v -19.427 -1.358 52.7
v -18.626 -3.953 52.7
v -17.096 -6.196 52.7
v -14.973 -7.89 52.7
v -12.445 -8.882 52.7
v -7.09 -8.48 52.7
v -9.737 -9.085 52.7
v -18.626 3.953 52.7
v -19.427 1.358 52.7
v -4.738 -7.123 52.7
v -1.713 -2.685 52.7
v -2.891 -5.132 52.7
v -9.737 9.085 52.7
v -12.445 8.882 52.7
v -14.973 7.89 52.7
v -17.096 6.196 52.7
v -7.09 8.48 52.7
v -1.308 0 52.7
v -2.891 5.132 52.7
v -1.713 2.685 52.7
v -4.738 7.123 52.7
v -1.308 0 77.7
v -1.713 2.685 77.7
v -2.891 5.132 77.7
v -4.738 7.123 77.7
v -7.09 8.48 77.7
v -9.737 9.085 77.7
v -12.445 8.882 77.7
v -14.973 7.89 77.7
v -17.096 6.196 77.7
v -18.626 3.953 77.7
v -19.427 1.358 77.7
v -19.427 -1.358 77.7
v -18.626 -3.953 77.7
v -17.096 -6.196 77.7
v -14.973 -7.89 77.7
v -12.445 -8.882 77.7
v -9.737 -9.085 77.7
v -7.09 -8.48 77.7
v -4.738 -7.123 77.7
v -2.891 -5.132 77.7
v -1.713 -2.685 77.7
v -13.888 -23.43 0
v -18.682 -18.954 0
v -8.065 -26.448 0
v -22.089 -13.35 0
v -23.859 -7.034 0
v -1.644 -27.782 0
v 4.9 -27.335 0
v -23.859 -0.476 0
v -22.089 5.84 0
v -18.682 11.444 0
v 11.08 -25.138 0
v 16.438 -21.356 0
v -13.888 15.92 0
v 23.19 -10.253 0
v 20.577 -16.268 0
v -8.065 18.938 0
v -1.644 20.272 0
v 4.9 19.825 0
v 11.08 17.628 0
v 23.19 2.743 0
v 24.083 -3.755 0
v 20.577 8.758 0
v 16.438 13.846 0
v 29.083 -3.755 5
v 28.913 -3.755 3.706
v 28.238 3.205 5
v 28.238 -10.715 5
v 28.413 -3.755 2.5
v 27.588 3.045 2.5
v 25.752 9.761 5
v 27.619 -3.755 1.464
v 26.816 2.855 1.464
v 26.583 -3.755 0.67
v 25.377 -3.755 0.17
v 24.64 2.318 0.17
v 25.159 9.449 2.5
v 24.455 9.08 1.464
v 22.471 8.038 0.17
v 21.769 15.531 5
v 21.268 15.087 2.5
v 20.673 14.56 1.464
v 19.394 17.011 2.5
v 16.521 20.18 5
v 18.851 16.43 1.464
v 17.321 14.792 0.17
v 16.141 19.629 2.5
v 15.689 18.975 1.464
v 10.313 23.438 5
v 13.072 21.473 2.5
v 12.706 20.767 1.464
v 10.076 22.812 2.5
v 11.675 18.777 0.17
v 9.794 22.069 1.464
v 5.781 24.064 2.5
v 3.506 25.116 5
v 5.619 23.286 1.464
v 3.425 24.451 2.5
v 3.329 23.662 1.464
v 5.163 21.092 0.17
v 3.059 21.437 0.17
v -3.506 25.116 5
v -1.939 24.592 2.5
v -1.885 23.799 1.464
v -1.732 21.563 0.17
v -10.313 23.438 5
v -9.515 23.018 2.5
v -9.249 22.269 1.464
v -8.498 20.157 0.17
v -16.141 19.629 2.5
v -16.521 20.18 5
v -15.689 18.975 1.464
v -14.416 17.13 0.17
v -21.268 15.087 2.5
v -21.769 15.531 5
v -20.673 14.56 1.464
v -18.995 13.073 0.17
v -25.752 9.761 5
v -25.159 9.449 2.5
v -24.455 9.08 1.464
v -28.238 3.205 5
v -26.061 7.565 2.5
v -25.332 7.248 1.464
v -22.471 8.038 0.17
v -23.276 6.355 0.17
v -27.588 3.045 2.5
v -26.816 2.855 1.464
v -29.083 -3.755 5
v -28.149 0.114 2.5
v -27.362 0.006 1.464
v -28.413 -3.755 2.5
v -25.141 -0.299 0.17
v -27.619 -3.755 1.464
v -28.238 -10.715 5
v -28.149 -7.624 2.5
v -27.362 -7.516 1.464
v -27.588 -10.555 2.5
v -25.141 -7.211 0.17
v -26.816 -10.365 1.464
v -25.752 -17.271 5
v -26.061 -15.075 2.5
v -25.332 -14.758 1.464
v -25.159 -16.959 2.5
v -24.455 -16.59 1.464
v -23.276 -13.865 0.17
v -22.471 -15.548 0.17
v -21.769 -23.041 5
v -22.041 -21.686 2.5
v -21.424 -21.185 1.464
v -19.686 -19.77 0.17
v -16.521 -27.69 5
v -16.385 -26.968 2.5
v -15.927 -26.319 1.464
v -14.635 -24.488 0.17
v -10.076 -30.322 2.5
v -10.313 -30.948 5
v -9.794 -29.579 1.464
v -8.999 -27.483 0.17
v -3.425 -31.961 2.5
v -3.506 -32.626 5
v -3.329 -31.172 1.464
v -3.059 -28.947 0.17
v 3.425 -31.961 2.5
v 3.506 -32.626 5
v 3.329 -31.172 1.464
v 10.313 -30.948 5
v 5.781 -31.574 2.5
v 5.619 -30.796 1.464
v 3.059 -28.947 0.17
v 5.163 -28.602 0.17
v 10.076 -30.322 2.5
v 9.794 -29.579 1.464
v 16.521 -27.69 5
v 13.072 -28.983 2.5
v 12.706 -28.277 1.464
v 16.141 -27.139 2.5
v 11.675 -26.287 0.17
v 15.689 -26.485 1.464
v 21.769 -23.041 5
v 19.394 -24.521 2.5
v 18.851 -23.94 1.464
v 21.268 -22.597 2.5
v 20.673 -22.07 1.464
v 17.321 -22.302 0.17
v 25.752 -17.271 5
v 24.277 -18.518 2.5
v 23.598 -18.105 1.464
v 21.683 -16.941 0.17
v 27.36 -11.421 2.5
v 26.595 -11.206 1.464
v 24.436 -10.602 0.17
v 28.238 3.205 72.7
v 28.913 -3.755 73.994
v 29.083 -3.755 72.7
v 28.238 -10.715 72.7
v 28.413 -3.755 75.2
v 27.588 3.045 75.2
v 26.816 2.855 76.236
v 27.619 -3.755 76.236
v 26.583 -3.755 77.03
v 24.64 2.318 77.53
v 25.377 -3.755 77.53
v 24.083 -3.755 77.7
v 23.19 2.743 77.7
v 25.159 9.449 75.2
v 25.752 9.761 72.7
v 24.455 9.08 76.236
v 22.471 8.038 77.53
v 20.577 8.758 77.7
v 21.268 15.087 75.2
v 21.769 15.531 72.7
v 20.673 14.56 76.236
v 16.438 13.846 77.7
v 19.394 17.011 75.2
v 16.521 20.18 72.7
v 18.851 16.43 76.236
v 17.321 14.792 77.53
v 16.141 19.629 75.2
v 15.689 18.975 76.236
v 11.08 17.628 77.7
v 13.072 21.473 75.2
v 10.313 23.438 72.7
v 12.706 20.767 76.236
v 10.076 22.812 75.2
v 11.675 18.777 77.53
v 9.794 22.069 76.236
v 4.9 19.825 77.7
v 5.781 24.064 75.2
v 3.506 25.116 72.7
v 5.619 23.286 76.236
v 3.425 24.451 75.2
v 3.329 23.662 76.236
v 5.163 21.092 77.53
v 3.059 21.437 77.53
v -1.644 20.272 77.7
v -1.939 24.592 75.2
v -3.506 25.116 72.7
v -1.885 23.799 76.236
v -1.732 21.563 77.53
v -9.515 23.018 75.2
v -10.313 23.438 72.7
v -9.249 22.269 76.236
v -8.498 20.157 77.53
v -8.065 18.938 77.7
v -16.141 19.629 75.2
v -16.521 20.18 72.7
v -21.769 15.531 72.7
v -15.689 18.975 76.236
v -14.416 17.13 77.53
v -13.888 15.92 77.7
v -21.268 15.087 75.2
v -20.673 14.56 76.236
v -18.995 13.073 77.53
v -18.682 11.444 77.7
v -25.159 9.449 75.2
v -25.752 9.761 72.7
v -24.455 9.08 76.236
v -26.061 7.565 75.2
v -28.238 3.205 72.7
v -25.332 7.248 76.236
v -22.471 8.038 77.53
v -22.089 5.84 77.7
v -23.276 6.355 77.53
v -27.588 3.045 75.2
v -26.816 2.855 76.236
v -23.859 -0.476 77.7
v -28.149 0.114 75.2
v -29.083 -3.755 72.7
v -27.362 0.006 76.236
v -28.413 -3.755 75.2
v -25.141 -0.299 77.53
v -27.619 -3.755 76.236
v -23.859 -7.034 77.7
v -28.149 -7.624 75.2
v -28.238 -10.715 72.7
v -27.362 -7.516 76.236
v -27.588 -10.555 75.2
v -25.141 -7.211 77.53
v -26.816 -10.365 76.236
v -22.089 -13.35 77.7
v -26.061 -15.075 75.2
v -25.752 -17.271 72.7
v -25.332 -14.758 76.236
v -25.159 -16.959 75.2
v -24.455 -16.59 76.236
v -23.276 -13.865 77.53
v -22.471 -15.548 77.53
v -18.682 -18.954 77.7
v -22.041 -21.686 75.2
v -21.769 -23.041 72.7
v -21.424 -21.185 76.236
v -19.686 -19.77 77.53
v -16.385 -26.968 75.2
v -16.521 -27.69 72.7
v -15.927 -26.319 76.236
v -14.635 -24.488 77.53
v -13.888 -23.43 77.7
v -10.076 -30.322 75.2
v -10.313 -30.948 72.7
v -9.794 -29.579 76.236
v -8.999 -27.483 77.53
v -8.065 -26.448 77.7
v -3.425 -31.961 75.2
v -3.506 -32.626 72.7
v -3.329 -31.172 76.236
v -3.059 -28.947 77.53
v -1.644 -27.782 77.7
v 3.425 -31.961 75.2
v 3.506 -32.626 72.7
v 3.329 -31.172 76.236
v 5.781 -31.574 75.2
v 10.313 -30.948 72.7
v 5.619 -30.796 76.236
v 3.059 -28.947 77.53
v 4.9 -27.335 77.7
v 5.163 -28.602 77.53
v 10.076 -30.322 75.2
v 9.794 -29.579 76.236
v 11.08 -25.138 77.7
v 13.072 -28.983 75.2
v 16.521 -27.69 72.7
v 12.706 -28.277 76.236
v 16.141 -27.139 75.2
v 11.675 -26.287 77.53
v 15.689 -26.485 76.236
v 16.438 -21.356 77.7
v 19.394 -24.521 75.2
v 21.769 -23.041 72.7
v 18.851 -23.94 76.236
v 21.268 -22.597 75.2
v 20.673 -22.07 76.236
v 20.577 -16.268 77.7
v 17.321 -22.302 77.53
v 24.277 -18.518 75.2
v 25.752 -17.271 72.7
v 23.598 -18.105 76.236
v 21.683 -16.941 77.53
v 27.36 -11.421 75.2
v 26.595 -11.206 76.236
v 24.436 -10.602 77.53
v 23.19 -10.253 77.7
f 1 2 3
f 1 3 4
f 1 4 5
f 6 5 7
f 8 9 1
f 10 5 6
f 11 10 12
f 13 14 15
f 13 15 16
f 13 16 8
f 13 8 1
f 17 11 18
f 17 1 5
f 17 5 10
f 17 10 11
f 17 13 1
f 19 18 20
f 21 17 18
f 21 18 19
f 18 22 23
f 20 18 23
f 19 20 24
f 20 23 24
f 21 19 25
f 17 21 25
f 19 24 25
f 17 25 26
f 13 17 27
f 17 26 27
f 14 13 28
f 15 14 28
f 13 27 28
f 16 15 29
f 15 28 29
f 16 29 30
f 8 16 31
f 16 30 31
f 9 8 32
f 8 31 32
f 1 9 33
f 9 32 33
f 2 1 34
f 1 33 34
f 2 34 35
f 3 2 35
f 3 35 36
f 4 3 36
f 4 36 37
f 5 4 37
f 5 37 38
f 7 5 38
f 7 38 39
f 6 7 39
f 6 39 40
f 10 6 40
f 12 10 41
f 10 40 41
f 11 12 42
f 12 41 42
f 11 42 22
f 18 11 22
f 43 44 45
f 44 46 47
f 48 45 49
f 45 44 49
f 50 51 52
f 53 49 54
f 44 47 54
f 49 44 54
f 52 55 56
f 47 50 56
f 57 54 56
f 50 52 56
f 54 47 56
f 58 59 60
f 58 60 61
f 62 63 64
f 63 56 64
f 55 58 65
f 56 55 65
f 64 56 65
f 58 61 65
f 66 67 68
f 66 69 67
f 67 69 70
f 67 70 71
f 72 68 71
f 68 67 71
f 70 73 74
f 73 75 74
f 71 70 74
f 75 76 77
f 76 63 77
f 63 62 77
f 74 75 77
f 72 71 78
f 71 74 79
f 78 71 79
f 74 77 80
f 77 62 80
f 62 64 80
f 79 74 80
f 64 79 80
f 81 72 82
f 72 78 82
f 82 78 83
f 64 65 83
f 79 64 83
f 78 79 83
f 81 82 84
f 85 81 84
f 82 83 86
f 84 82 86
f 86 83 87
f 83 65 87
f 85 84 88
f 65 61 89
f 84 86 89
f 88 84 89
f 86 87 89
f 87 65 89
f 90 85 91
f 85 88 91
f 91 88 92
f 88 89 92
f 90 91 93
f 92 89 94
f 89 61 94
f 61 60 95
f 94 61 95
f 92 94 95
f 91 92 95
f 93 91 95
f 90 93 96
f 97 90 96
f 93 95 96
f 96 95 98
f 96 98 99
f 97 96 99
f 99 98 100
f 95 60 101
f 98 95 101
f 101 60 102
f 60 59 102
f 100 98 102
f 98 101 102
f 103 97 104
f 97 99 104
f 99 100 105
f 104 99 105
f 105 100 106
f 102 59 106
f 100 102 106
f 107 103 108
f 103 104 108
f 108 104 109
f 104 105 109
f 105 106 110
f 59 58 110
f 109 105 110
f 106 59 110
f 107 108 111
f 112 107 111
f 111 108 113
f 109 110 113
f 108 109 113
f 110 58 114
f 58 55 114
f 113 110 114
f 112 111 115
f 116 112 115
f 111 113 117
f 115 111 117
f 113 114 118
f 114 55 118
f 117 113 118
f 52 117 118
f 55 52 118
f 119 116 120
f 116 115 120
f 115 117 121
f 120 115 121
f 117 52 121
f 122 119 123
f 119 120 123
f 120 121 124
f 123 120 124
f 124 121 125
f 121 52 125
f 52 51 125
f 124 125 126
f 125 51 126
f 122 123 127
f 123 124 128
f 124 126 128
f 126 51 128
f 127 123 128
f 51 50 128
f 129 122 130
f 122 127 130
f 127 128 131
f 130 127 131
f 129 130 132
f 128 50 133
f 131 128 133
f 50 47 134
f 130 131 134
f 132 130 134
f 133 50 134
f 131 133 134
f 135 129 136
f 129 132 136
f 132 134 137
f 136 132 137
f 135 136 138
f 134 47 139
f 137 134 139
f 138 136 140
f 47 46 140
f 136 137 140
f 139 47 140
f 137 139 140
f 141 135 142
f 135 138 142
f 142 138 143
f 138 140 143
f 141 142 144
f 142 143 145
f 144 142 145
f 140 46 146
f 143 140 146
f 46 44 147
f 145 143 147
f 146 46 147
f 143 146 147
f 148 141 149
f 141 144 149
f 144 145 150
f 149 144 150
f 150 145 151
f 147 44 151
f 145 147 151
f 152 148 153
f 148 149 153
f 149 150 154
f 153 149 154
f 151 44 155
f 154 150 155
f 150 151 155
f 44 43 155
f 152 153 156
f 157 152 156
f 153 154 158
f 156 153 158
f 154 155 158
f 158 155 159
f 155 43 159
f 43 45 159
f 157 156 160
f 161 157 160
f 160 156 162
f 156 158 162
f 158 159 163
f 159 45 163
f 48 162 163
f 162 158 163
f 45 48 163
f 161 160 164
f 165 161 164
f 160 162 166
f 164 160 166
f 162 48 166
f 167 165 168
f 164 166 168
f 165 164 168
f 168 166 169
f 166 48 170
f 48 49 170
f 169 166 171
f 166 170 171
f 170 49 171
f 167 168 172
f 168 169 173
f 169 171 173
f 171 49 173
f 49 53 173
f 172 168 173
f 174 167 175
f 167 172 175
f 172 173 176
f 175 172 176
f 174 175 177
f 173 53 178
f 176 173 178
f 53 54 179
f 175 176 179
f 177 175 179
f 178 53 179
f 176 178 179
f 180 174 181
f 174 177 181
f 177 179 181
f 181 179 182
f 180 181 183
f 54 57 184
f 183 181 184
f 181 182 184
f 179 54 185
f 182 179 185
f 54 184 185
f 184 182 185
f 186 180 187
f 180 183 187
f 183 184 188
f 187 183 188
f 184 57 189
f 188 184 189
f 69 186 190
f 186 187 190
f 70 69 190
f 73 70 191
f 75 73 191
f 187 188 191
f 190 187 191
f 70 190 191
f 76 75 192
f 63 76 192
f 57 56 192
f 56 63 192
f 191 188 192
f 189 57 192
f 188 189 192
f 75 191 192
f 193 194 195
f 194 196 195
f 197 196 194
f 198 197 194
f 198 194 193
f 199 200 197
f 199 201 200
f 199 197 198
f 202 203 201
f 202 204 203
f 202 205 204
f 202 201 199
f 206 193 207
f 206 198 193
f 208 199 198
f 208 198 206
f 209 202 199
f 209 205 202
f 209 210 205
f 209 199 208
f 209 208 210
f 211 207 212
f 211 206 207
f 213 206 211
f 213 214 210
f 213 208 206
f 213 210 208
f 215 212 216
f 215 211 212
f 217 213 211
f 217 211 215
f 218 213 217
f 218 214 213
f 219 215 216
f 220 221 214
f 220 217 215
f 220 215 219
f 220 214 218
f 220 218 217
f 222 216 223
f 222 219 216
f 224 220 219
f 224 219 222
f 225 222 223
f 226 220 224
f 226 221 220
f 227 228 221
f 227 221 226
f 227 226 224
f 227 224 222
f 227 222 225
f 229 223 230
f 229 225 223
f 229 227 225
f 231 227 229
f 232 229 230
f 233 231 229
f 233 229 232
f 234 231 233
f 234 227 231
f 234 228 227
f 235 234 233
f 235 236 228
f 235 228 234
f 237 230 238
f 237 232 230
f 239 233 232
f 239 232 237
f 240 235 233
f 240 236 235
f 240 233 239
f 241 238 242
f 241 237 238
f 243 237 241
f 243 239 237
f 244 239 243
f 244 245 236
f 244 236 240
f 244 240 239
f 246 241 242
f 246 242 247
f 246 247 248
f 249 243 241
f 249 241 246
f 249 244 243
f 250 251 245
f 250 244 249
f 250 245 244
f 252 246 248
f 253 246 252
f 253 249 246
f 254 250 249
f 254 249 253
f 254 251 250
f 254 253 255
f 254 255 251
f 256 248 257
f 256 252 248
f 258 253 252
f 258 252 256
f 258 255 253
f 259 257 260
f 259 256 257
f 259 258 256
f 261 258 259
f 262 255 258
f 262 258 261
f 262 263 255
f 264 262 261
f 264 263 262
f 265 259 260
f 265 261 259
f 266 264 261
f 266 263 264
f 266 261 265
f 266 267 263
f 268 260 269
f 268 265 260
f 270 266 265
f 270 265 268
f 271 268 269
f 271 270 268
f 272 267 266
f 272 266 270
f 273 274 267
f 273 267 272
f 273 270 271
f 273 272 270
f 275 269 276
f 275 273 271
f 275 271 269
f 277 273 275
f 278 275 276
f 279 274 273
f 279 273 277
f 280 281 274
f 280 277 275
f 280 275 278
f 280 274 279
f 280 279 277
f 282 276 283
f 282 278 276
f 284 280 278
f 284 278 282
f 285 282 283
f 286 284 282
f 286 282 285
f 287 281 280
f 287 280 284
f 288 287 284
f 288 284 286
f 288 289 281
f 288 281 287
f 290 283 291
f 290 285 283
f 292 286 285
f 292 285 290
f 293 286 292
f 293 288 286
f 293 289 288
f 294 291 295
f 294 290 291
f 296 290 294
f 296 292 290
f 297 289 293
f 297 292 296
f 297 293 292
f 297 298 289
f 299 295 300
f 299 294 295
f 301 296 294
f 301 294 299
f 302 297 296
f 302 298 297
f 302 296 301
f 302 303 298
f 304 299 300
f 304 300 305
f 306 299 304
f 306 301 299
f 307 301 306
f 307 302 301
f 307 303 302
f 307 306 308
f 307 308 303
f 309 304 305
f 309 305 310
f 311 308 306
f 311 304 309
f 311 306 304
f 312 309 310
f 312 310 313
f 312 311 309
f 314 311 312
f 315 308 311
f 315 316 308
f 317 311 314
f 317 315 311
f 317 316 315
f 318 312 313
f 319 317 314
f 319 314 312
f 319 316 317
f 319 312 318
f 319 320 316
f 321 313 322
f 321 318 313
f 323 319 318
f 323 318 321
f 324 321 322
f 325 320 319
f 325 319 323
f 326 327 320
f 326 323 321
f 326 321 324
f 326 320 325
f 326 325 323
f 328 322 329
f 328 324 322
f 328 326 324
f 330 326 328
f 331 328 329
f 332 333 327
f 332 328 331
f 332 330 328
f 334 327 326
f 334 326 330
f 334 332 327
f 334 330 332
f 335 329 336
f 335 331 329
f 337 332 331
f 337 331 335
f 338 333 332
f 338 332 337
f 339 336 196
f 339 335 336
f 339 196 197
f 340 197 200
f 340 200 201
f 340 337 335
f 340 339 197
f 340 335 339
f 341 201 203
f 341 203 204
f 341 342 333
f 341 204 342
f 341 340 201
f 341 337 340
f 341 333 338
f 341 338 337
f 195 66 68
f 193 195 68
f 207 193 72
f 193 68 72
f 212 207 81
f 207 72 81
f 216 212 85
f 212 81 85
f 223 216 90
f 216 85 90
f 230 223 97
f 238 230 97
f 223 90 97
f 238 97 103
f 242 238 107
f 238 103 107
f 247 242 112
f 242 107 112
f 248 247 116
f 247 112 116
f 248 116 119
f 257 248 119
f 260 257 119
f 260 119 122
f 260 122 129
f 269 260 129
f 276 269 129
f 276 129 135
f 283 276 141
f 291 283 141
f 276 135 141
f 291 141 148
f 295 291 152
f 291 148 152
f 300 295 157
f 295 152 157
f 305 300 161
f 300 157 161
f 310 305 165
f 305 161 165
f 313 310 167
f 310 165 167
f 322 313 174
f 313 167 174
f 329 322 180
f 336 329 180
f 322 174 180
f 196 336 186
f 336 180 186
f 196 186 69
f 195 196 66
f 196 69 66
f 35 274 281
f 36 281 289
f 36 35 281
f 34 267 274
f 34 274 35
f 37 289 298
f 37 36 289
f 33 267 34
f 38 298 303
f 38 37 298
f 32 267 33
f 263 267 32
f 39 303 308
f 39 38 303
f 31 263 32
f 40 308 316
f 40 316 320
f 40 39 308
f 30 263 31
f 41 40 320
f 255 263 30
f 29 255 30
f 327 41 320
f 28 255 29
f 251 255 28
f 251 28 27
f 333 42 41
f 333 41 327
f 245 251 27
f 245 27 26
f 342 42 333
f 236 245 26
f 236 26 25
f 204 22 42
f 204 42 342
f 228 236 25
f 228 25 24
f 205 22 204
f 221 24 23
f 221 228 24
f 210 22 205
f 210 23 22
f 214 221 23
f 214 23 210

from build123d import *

# Parameters (mm, degrees)
F0_R     = 29.083319
F1_DEPTH = 77.7
F2_R     = 9.110052
F3_DEPTH = 25
F4_R     = 5


with BuildPart() as f1:
    # F0 (on Top) → F1 (new body)
    with BuildSketch(Plane.XY):
        with Locations((0, -3.755013)):
            Circle(F0_R)
    extrude(amount=F1_DEPTH)

    # F2 (on face) → F3 (cut)
    with BuildSketch(Plane.XY.offset(77.7)):
        with Locations((-10.418282, 0)):
            Circle(F2_R)
    extrude(amount=-F3_DEPTH, mode=Mode.SUBTRACT)

    # F4
    f4_edges = [f1.edges().sort_by_distance(p)[0] for p in [
        (-29.083319, -3.755013, 77.7),
        (-29.083319, -3.755013, 0),
    ]]
    fillet(f4_edges, radius=F4_R)


solid = f1.part
